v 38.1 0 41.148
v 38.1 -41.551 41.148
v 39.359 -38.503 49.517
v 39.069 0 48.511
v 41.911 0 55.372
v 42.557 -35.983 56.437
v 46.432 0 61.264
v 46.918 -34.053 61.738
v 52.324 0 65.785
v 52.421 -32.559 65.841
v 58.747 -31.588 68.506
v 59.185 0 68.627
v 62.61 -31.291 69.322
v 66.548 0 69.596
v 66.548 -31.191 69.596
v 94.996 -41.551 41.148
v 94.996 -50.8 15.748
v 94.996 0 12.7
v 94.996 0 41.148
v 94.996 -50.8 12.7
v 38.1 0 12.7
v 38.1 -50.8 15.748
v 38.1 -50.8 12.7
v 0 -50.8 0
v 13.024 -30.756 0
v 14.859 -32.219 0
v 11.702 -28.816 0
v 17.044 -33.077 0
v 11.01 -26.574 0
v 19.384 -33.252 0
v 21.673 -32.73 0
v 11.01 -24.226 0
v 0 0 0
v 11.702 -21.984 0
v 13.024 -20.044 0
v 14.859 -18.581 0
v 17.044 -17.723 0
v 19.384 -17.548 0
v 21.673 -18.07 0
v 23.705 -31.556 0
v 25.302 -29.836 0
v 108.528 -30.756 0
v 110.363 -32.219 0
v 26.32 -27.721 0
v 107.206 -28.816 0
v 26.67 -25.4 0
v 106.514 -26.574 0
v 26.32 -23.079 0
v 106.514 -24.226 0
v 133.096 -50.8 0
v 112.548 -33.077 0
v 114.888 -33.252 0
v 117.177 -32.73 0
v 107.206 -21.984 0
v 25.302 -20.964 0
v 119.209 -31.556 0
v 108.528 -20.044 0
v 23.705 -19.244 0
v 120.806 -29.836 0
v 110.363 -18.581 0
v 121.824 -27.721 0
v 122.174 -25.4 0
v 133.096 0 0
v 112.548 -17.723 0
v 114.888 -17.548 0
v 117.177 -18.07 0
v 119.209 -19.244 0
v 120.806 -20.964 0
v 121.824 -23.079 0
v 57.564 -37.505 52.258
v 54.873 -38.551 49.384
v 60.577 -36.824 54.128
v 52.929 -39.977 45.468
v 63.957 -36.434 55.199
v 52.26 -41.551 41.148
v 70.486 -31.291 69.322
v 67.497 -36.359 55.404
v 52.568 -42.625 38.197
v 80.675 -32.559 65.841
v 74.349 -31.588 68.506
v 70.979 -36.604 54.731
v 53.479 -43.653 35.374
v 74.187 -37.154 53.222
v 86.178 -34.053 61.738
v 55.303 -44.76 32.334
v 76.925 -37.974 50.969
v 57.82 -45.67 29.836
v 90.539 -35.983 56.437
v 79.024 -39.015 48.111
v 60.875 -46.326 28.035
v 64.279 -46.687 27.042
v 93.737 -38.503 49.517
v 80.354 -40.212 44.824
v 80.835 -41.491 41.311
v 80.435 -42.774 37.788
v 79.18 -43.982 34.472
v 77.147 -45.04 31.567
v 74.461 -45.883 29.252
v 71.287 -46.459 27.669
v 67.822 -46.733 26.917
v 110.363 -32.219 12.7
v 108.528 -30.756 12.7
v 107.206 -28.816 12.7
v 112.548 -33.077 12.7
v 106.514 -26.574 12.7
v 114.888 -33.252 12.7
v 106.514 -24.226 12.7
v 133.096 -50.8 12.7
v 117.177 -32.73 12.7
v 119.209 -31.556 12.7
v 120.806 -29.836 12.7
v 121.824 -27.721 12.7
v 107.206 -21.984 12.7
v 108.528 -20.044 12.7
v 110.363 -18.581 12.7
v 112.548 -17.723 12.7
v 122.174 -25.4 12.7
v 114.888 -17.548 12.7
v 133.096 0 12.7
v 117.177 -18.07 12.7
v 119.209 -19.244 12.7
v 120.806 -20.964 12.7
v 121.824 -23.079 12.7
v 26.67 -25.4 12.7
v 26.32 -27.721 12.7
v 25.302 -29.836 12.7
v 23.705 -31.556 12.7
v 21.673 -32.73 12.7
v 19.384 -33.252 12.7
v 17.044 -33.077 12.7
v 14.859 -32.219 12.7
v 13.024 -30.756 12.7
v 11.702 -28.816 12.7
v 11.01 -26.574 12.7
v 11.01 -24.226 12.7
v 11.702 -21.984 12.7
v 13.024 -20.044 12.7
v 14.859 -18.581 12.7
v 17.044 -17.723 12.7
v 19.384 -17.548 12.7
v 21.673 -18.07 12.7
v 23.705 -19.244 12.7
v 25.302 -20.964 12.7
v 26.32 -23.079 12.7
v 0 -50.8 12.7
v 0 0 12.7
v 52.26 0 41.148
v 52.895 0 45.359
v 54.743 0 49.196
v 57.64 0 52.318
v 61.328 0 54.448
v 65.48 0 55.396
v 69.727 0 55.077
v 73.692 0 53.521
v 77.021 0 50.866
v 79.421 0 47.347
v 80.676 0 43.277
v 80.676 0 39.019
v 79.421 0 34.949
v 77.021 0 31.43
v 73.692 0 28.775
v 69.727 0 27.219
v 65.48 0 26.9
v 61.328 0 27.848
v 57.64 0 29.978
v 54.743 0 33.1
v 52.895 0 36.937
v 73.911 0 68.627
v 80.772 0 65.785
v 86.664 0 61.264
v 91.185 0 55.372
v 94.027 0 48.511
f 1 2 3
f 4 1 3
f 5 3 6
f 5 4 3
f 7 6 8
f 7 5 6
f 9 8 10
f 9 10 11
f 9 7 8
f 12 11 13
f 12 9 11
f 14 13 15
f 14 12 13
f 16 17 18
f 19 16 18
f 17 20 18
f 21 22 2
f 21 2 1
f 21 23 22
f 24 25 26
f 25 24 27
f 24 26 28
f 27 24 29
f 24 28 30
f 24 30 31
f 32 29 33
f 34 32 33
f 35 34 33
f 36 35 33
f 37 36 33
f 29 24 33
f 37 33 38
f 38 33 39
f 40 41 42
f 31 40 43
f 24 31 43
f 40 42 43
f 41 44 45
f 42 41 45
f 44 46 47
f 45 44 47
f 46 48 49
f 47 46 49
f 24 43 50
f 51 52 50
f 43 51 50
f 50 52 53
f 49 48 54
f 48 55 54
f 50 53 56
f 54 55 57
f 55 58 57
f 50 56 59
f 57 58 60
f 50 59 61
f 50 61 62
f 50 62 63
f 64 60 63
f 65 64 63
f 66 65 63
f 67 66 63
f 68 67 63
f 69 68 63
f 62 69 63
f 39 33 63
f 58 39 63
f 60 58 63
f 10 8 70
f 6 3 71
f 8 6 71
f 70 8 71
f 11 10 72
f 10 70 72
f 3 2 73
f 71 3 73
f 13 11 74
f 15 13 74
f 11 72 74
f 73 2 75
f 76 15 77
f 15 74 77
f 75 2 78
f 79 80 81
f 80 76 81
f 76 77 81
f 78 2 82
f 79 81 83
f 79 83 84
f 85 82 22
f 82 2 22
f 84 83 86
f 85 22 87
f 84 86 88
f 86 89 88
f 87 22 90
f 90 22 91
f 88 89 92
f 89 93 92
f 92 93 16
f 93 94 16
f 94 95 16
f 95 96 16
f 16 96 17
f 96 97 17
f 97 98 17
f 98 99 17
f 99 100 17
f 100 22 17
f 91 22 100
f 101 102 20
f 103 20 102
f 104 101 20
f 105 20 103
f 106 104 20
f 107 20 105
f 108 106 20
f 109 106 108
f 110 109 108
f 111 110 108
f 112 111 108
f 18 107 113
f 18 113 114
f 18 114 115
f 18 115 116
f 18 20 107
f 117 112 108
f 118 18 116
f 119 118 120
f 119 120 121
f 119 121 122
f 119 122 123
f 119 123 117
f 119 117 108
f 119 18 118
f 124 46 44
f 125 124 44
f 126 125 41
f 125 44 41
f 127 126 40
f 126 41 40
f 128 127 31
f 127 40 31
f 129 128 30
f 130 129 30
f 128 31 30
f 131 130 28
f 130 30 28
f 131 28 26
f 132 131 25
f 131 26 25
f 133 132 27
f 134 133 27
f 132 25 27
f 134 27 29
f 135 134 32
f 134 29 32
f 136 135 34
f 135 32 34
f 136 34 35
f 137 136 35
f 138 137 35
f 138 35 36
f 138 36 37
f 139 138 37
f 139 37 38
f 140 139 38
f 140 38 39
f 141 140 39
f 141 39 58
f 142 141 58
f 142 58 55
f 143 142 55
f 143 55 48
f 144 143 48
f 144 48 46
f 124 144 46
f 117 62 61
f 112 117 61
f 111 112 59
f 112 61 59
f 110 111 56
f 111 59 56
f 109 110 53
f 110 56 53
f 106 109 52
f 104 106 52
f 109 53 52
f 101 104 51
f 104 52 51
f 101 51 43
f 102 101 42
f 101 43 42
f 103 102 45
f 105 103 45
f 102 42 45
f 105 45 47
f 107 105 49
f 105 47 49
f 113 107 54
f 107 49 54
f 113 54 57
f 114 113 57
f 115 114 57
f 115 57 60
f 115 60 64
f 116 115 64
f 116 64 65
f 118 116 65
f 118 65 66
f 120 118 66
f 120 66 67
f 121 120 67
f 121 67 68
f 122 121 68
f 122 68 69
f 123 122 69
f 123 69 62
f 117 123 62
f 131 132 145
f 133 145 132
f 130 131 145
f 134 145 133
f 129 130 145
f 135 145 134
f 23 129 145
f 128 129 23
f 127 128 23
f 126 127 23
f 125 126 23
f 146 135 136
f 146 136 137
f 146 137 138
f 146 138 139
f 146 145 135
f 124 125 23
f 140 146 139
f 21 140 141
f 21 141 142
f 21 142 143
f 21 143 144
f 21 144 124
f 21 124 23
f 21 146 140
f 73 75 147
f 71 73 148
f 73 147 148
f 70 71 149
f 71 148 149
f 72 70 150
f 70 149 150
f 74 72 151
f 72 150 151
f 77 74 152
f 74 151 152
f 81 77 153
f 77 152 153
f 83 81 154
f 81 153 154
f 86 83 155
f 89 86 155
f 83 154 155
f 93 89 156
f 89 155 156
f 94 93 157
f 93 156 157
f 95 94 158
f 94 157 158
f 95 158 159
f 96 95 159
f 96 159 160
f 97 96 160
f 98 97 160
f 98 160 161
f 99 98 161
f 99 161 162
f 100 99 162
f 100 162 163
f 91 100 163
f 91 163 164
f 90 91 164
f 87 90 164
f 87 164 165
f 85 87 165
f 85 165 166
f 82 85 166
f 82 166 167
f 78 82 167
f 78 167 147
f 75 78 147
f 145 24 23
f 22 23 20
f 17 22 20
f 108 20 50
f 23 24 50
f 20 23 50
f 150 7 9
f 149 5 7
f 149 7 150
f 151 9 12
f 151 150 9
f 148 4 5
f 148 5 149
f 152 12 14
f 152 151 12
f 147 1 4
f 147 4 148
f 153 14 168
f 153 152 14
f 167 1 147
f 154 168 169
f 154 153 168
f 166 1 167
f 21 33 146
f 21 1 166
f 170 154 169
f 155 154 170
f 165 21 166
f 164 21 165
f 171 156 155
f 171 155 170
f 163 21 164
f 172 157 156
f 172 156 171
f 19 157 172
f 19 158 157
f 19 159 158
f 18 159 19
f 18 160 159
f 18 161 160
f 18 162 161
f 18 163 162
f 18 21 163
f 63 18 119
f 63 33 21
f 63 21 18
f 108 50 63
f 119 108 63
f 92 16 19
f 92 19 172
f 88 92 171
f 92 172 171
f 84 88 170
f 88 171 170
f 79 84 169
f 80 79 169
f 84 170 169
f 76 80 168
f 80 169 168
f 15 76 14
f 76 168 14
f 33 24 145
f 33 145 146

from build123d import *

# Parameters (mm, degrees)
F0_W      = 133.096
F0_H      = 50.8
F1_DEPTH  = 12.7
F2_W      = 56.896
F2_H      = 50.8
F3_DEPTH  = 56.896
F4_SIZE2  = 53.848
F4_SIZE   = 19.6088
F5_R      = 14.2875
F6_DEPTH  = 50.8
F7_R      = 28.44799
F9_R      = 7.874
F8_R      = 7.874
F10_DEPTH = 25.4


# Not quite as in the source:
# - a fillet or chamfer is up to 0.001 mm smaller than in the source, because OpenCascade refuses the exact size


with BuildPart() as f1:
    # F0 (on Top) → F1 (new body)
    with BuildSketch(Plane.XY):
        with Locations((66.548, -25.4)):
            Rectangle(F0_W, F0_H)
    extrude(amount=F1_DEPTH)

    # F2 (on face) → F3 (join)
    with BuildSketch(Plane.XY.offset(12.7)):
        with Locations((66.548, -25.4)):
            Rectangle(F2_W, F2_H)
    extrude(amount=F3_DEPTH)

    # F4
    f4_edges = [f1.edges().sort_by_distance(p)[0] for p in [
        (66.548, -50.8, 69.596),
    ]]
    f4_side = f1.faces().sort_by_distance((66.548, -25.4, 69.596))[0]
    chamfer(f4_edges, length=F4_SIZE, length2=F4_SIZE2, reference=f4_side)

    # F5 (on face) → F6 (cut)
    with BuildSketch(Plane(origin=(0, 0, 0), x_dir=(-1, 0, 0), z_dir=(0, 1, 0))):
        with Locations((-66.548, 41.148)):
            Circle(F5_R)
    extrude(amount=-F6_DEPTH, mode=Mode.SUBTRACT)

    # F7 (radius 28.448 in the source; OpenCascade refuses exactly that, so slightly less here)
    f7_edges = [f1.edges().sort_by_distance(p)[0] for p in [
        (94.996, -15.5956, 69.596),
        (38.1, -15.5956, 69.596),
    ]]
    fillet(f7_edges, radius=F7_R)

    # F9 (on face) + F8 (on face) → F10 (cut)
    with BuildSketch(Plane(origin=(0, 0, 0), x_dir=(1, 0, 0), z_dir=(0, 0, -1))):
        with Locations((18.796, 25.4)):
            Circle(F9_R)
    with BuildSketch(Plane(origin=(0, 0, 0), x_dir=(1, 0, 0), z_dir=(0, 0, -1))):
        with Locations((114.3, 25.4)):
            Circle(F8_R)
    extrude(amount=-F10_DEPTH, mode=Mode.SUBTRACT)


solid = f1.part
